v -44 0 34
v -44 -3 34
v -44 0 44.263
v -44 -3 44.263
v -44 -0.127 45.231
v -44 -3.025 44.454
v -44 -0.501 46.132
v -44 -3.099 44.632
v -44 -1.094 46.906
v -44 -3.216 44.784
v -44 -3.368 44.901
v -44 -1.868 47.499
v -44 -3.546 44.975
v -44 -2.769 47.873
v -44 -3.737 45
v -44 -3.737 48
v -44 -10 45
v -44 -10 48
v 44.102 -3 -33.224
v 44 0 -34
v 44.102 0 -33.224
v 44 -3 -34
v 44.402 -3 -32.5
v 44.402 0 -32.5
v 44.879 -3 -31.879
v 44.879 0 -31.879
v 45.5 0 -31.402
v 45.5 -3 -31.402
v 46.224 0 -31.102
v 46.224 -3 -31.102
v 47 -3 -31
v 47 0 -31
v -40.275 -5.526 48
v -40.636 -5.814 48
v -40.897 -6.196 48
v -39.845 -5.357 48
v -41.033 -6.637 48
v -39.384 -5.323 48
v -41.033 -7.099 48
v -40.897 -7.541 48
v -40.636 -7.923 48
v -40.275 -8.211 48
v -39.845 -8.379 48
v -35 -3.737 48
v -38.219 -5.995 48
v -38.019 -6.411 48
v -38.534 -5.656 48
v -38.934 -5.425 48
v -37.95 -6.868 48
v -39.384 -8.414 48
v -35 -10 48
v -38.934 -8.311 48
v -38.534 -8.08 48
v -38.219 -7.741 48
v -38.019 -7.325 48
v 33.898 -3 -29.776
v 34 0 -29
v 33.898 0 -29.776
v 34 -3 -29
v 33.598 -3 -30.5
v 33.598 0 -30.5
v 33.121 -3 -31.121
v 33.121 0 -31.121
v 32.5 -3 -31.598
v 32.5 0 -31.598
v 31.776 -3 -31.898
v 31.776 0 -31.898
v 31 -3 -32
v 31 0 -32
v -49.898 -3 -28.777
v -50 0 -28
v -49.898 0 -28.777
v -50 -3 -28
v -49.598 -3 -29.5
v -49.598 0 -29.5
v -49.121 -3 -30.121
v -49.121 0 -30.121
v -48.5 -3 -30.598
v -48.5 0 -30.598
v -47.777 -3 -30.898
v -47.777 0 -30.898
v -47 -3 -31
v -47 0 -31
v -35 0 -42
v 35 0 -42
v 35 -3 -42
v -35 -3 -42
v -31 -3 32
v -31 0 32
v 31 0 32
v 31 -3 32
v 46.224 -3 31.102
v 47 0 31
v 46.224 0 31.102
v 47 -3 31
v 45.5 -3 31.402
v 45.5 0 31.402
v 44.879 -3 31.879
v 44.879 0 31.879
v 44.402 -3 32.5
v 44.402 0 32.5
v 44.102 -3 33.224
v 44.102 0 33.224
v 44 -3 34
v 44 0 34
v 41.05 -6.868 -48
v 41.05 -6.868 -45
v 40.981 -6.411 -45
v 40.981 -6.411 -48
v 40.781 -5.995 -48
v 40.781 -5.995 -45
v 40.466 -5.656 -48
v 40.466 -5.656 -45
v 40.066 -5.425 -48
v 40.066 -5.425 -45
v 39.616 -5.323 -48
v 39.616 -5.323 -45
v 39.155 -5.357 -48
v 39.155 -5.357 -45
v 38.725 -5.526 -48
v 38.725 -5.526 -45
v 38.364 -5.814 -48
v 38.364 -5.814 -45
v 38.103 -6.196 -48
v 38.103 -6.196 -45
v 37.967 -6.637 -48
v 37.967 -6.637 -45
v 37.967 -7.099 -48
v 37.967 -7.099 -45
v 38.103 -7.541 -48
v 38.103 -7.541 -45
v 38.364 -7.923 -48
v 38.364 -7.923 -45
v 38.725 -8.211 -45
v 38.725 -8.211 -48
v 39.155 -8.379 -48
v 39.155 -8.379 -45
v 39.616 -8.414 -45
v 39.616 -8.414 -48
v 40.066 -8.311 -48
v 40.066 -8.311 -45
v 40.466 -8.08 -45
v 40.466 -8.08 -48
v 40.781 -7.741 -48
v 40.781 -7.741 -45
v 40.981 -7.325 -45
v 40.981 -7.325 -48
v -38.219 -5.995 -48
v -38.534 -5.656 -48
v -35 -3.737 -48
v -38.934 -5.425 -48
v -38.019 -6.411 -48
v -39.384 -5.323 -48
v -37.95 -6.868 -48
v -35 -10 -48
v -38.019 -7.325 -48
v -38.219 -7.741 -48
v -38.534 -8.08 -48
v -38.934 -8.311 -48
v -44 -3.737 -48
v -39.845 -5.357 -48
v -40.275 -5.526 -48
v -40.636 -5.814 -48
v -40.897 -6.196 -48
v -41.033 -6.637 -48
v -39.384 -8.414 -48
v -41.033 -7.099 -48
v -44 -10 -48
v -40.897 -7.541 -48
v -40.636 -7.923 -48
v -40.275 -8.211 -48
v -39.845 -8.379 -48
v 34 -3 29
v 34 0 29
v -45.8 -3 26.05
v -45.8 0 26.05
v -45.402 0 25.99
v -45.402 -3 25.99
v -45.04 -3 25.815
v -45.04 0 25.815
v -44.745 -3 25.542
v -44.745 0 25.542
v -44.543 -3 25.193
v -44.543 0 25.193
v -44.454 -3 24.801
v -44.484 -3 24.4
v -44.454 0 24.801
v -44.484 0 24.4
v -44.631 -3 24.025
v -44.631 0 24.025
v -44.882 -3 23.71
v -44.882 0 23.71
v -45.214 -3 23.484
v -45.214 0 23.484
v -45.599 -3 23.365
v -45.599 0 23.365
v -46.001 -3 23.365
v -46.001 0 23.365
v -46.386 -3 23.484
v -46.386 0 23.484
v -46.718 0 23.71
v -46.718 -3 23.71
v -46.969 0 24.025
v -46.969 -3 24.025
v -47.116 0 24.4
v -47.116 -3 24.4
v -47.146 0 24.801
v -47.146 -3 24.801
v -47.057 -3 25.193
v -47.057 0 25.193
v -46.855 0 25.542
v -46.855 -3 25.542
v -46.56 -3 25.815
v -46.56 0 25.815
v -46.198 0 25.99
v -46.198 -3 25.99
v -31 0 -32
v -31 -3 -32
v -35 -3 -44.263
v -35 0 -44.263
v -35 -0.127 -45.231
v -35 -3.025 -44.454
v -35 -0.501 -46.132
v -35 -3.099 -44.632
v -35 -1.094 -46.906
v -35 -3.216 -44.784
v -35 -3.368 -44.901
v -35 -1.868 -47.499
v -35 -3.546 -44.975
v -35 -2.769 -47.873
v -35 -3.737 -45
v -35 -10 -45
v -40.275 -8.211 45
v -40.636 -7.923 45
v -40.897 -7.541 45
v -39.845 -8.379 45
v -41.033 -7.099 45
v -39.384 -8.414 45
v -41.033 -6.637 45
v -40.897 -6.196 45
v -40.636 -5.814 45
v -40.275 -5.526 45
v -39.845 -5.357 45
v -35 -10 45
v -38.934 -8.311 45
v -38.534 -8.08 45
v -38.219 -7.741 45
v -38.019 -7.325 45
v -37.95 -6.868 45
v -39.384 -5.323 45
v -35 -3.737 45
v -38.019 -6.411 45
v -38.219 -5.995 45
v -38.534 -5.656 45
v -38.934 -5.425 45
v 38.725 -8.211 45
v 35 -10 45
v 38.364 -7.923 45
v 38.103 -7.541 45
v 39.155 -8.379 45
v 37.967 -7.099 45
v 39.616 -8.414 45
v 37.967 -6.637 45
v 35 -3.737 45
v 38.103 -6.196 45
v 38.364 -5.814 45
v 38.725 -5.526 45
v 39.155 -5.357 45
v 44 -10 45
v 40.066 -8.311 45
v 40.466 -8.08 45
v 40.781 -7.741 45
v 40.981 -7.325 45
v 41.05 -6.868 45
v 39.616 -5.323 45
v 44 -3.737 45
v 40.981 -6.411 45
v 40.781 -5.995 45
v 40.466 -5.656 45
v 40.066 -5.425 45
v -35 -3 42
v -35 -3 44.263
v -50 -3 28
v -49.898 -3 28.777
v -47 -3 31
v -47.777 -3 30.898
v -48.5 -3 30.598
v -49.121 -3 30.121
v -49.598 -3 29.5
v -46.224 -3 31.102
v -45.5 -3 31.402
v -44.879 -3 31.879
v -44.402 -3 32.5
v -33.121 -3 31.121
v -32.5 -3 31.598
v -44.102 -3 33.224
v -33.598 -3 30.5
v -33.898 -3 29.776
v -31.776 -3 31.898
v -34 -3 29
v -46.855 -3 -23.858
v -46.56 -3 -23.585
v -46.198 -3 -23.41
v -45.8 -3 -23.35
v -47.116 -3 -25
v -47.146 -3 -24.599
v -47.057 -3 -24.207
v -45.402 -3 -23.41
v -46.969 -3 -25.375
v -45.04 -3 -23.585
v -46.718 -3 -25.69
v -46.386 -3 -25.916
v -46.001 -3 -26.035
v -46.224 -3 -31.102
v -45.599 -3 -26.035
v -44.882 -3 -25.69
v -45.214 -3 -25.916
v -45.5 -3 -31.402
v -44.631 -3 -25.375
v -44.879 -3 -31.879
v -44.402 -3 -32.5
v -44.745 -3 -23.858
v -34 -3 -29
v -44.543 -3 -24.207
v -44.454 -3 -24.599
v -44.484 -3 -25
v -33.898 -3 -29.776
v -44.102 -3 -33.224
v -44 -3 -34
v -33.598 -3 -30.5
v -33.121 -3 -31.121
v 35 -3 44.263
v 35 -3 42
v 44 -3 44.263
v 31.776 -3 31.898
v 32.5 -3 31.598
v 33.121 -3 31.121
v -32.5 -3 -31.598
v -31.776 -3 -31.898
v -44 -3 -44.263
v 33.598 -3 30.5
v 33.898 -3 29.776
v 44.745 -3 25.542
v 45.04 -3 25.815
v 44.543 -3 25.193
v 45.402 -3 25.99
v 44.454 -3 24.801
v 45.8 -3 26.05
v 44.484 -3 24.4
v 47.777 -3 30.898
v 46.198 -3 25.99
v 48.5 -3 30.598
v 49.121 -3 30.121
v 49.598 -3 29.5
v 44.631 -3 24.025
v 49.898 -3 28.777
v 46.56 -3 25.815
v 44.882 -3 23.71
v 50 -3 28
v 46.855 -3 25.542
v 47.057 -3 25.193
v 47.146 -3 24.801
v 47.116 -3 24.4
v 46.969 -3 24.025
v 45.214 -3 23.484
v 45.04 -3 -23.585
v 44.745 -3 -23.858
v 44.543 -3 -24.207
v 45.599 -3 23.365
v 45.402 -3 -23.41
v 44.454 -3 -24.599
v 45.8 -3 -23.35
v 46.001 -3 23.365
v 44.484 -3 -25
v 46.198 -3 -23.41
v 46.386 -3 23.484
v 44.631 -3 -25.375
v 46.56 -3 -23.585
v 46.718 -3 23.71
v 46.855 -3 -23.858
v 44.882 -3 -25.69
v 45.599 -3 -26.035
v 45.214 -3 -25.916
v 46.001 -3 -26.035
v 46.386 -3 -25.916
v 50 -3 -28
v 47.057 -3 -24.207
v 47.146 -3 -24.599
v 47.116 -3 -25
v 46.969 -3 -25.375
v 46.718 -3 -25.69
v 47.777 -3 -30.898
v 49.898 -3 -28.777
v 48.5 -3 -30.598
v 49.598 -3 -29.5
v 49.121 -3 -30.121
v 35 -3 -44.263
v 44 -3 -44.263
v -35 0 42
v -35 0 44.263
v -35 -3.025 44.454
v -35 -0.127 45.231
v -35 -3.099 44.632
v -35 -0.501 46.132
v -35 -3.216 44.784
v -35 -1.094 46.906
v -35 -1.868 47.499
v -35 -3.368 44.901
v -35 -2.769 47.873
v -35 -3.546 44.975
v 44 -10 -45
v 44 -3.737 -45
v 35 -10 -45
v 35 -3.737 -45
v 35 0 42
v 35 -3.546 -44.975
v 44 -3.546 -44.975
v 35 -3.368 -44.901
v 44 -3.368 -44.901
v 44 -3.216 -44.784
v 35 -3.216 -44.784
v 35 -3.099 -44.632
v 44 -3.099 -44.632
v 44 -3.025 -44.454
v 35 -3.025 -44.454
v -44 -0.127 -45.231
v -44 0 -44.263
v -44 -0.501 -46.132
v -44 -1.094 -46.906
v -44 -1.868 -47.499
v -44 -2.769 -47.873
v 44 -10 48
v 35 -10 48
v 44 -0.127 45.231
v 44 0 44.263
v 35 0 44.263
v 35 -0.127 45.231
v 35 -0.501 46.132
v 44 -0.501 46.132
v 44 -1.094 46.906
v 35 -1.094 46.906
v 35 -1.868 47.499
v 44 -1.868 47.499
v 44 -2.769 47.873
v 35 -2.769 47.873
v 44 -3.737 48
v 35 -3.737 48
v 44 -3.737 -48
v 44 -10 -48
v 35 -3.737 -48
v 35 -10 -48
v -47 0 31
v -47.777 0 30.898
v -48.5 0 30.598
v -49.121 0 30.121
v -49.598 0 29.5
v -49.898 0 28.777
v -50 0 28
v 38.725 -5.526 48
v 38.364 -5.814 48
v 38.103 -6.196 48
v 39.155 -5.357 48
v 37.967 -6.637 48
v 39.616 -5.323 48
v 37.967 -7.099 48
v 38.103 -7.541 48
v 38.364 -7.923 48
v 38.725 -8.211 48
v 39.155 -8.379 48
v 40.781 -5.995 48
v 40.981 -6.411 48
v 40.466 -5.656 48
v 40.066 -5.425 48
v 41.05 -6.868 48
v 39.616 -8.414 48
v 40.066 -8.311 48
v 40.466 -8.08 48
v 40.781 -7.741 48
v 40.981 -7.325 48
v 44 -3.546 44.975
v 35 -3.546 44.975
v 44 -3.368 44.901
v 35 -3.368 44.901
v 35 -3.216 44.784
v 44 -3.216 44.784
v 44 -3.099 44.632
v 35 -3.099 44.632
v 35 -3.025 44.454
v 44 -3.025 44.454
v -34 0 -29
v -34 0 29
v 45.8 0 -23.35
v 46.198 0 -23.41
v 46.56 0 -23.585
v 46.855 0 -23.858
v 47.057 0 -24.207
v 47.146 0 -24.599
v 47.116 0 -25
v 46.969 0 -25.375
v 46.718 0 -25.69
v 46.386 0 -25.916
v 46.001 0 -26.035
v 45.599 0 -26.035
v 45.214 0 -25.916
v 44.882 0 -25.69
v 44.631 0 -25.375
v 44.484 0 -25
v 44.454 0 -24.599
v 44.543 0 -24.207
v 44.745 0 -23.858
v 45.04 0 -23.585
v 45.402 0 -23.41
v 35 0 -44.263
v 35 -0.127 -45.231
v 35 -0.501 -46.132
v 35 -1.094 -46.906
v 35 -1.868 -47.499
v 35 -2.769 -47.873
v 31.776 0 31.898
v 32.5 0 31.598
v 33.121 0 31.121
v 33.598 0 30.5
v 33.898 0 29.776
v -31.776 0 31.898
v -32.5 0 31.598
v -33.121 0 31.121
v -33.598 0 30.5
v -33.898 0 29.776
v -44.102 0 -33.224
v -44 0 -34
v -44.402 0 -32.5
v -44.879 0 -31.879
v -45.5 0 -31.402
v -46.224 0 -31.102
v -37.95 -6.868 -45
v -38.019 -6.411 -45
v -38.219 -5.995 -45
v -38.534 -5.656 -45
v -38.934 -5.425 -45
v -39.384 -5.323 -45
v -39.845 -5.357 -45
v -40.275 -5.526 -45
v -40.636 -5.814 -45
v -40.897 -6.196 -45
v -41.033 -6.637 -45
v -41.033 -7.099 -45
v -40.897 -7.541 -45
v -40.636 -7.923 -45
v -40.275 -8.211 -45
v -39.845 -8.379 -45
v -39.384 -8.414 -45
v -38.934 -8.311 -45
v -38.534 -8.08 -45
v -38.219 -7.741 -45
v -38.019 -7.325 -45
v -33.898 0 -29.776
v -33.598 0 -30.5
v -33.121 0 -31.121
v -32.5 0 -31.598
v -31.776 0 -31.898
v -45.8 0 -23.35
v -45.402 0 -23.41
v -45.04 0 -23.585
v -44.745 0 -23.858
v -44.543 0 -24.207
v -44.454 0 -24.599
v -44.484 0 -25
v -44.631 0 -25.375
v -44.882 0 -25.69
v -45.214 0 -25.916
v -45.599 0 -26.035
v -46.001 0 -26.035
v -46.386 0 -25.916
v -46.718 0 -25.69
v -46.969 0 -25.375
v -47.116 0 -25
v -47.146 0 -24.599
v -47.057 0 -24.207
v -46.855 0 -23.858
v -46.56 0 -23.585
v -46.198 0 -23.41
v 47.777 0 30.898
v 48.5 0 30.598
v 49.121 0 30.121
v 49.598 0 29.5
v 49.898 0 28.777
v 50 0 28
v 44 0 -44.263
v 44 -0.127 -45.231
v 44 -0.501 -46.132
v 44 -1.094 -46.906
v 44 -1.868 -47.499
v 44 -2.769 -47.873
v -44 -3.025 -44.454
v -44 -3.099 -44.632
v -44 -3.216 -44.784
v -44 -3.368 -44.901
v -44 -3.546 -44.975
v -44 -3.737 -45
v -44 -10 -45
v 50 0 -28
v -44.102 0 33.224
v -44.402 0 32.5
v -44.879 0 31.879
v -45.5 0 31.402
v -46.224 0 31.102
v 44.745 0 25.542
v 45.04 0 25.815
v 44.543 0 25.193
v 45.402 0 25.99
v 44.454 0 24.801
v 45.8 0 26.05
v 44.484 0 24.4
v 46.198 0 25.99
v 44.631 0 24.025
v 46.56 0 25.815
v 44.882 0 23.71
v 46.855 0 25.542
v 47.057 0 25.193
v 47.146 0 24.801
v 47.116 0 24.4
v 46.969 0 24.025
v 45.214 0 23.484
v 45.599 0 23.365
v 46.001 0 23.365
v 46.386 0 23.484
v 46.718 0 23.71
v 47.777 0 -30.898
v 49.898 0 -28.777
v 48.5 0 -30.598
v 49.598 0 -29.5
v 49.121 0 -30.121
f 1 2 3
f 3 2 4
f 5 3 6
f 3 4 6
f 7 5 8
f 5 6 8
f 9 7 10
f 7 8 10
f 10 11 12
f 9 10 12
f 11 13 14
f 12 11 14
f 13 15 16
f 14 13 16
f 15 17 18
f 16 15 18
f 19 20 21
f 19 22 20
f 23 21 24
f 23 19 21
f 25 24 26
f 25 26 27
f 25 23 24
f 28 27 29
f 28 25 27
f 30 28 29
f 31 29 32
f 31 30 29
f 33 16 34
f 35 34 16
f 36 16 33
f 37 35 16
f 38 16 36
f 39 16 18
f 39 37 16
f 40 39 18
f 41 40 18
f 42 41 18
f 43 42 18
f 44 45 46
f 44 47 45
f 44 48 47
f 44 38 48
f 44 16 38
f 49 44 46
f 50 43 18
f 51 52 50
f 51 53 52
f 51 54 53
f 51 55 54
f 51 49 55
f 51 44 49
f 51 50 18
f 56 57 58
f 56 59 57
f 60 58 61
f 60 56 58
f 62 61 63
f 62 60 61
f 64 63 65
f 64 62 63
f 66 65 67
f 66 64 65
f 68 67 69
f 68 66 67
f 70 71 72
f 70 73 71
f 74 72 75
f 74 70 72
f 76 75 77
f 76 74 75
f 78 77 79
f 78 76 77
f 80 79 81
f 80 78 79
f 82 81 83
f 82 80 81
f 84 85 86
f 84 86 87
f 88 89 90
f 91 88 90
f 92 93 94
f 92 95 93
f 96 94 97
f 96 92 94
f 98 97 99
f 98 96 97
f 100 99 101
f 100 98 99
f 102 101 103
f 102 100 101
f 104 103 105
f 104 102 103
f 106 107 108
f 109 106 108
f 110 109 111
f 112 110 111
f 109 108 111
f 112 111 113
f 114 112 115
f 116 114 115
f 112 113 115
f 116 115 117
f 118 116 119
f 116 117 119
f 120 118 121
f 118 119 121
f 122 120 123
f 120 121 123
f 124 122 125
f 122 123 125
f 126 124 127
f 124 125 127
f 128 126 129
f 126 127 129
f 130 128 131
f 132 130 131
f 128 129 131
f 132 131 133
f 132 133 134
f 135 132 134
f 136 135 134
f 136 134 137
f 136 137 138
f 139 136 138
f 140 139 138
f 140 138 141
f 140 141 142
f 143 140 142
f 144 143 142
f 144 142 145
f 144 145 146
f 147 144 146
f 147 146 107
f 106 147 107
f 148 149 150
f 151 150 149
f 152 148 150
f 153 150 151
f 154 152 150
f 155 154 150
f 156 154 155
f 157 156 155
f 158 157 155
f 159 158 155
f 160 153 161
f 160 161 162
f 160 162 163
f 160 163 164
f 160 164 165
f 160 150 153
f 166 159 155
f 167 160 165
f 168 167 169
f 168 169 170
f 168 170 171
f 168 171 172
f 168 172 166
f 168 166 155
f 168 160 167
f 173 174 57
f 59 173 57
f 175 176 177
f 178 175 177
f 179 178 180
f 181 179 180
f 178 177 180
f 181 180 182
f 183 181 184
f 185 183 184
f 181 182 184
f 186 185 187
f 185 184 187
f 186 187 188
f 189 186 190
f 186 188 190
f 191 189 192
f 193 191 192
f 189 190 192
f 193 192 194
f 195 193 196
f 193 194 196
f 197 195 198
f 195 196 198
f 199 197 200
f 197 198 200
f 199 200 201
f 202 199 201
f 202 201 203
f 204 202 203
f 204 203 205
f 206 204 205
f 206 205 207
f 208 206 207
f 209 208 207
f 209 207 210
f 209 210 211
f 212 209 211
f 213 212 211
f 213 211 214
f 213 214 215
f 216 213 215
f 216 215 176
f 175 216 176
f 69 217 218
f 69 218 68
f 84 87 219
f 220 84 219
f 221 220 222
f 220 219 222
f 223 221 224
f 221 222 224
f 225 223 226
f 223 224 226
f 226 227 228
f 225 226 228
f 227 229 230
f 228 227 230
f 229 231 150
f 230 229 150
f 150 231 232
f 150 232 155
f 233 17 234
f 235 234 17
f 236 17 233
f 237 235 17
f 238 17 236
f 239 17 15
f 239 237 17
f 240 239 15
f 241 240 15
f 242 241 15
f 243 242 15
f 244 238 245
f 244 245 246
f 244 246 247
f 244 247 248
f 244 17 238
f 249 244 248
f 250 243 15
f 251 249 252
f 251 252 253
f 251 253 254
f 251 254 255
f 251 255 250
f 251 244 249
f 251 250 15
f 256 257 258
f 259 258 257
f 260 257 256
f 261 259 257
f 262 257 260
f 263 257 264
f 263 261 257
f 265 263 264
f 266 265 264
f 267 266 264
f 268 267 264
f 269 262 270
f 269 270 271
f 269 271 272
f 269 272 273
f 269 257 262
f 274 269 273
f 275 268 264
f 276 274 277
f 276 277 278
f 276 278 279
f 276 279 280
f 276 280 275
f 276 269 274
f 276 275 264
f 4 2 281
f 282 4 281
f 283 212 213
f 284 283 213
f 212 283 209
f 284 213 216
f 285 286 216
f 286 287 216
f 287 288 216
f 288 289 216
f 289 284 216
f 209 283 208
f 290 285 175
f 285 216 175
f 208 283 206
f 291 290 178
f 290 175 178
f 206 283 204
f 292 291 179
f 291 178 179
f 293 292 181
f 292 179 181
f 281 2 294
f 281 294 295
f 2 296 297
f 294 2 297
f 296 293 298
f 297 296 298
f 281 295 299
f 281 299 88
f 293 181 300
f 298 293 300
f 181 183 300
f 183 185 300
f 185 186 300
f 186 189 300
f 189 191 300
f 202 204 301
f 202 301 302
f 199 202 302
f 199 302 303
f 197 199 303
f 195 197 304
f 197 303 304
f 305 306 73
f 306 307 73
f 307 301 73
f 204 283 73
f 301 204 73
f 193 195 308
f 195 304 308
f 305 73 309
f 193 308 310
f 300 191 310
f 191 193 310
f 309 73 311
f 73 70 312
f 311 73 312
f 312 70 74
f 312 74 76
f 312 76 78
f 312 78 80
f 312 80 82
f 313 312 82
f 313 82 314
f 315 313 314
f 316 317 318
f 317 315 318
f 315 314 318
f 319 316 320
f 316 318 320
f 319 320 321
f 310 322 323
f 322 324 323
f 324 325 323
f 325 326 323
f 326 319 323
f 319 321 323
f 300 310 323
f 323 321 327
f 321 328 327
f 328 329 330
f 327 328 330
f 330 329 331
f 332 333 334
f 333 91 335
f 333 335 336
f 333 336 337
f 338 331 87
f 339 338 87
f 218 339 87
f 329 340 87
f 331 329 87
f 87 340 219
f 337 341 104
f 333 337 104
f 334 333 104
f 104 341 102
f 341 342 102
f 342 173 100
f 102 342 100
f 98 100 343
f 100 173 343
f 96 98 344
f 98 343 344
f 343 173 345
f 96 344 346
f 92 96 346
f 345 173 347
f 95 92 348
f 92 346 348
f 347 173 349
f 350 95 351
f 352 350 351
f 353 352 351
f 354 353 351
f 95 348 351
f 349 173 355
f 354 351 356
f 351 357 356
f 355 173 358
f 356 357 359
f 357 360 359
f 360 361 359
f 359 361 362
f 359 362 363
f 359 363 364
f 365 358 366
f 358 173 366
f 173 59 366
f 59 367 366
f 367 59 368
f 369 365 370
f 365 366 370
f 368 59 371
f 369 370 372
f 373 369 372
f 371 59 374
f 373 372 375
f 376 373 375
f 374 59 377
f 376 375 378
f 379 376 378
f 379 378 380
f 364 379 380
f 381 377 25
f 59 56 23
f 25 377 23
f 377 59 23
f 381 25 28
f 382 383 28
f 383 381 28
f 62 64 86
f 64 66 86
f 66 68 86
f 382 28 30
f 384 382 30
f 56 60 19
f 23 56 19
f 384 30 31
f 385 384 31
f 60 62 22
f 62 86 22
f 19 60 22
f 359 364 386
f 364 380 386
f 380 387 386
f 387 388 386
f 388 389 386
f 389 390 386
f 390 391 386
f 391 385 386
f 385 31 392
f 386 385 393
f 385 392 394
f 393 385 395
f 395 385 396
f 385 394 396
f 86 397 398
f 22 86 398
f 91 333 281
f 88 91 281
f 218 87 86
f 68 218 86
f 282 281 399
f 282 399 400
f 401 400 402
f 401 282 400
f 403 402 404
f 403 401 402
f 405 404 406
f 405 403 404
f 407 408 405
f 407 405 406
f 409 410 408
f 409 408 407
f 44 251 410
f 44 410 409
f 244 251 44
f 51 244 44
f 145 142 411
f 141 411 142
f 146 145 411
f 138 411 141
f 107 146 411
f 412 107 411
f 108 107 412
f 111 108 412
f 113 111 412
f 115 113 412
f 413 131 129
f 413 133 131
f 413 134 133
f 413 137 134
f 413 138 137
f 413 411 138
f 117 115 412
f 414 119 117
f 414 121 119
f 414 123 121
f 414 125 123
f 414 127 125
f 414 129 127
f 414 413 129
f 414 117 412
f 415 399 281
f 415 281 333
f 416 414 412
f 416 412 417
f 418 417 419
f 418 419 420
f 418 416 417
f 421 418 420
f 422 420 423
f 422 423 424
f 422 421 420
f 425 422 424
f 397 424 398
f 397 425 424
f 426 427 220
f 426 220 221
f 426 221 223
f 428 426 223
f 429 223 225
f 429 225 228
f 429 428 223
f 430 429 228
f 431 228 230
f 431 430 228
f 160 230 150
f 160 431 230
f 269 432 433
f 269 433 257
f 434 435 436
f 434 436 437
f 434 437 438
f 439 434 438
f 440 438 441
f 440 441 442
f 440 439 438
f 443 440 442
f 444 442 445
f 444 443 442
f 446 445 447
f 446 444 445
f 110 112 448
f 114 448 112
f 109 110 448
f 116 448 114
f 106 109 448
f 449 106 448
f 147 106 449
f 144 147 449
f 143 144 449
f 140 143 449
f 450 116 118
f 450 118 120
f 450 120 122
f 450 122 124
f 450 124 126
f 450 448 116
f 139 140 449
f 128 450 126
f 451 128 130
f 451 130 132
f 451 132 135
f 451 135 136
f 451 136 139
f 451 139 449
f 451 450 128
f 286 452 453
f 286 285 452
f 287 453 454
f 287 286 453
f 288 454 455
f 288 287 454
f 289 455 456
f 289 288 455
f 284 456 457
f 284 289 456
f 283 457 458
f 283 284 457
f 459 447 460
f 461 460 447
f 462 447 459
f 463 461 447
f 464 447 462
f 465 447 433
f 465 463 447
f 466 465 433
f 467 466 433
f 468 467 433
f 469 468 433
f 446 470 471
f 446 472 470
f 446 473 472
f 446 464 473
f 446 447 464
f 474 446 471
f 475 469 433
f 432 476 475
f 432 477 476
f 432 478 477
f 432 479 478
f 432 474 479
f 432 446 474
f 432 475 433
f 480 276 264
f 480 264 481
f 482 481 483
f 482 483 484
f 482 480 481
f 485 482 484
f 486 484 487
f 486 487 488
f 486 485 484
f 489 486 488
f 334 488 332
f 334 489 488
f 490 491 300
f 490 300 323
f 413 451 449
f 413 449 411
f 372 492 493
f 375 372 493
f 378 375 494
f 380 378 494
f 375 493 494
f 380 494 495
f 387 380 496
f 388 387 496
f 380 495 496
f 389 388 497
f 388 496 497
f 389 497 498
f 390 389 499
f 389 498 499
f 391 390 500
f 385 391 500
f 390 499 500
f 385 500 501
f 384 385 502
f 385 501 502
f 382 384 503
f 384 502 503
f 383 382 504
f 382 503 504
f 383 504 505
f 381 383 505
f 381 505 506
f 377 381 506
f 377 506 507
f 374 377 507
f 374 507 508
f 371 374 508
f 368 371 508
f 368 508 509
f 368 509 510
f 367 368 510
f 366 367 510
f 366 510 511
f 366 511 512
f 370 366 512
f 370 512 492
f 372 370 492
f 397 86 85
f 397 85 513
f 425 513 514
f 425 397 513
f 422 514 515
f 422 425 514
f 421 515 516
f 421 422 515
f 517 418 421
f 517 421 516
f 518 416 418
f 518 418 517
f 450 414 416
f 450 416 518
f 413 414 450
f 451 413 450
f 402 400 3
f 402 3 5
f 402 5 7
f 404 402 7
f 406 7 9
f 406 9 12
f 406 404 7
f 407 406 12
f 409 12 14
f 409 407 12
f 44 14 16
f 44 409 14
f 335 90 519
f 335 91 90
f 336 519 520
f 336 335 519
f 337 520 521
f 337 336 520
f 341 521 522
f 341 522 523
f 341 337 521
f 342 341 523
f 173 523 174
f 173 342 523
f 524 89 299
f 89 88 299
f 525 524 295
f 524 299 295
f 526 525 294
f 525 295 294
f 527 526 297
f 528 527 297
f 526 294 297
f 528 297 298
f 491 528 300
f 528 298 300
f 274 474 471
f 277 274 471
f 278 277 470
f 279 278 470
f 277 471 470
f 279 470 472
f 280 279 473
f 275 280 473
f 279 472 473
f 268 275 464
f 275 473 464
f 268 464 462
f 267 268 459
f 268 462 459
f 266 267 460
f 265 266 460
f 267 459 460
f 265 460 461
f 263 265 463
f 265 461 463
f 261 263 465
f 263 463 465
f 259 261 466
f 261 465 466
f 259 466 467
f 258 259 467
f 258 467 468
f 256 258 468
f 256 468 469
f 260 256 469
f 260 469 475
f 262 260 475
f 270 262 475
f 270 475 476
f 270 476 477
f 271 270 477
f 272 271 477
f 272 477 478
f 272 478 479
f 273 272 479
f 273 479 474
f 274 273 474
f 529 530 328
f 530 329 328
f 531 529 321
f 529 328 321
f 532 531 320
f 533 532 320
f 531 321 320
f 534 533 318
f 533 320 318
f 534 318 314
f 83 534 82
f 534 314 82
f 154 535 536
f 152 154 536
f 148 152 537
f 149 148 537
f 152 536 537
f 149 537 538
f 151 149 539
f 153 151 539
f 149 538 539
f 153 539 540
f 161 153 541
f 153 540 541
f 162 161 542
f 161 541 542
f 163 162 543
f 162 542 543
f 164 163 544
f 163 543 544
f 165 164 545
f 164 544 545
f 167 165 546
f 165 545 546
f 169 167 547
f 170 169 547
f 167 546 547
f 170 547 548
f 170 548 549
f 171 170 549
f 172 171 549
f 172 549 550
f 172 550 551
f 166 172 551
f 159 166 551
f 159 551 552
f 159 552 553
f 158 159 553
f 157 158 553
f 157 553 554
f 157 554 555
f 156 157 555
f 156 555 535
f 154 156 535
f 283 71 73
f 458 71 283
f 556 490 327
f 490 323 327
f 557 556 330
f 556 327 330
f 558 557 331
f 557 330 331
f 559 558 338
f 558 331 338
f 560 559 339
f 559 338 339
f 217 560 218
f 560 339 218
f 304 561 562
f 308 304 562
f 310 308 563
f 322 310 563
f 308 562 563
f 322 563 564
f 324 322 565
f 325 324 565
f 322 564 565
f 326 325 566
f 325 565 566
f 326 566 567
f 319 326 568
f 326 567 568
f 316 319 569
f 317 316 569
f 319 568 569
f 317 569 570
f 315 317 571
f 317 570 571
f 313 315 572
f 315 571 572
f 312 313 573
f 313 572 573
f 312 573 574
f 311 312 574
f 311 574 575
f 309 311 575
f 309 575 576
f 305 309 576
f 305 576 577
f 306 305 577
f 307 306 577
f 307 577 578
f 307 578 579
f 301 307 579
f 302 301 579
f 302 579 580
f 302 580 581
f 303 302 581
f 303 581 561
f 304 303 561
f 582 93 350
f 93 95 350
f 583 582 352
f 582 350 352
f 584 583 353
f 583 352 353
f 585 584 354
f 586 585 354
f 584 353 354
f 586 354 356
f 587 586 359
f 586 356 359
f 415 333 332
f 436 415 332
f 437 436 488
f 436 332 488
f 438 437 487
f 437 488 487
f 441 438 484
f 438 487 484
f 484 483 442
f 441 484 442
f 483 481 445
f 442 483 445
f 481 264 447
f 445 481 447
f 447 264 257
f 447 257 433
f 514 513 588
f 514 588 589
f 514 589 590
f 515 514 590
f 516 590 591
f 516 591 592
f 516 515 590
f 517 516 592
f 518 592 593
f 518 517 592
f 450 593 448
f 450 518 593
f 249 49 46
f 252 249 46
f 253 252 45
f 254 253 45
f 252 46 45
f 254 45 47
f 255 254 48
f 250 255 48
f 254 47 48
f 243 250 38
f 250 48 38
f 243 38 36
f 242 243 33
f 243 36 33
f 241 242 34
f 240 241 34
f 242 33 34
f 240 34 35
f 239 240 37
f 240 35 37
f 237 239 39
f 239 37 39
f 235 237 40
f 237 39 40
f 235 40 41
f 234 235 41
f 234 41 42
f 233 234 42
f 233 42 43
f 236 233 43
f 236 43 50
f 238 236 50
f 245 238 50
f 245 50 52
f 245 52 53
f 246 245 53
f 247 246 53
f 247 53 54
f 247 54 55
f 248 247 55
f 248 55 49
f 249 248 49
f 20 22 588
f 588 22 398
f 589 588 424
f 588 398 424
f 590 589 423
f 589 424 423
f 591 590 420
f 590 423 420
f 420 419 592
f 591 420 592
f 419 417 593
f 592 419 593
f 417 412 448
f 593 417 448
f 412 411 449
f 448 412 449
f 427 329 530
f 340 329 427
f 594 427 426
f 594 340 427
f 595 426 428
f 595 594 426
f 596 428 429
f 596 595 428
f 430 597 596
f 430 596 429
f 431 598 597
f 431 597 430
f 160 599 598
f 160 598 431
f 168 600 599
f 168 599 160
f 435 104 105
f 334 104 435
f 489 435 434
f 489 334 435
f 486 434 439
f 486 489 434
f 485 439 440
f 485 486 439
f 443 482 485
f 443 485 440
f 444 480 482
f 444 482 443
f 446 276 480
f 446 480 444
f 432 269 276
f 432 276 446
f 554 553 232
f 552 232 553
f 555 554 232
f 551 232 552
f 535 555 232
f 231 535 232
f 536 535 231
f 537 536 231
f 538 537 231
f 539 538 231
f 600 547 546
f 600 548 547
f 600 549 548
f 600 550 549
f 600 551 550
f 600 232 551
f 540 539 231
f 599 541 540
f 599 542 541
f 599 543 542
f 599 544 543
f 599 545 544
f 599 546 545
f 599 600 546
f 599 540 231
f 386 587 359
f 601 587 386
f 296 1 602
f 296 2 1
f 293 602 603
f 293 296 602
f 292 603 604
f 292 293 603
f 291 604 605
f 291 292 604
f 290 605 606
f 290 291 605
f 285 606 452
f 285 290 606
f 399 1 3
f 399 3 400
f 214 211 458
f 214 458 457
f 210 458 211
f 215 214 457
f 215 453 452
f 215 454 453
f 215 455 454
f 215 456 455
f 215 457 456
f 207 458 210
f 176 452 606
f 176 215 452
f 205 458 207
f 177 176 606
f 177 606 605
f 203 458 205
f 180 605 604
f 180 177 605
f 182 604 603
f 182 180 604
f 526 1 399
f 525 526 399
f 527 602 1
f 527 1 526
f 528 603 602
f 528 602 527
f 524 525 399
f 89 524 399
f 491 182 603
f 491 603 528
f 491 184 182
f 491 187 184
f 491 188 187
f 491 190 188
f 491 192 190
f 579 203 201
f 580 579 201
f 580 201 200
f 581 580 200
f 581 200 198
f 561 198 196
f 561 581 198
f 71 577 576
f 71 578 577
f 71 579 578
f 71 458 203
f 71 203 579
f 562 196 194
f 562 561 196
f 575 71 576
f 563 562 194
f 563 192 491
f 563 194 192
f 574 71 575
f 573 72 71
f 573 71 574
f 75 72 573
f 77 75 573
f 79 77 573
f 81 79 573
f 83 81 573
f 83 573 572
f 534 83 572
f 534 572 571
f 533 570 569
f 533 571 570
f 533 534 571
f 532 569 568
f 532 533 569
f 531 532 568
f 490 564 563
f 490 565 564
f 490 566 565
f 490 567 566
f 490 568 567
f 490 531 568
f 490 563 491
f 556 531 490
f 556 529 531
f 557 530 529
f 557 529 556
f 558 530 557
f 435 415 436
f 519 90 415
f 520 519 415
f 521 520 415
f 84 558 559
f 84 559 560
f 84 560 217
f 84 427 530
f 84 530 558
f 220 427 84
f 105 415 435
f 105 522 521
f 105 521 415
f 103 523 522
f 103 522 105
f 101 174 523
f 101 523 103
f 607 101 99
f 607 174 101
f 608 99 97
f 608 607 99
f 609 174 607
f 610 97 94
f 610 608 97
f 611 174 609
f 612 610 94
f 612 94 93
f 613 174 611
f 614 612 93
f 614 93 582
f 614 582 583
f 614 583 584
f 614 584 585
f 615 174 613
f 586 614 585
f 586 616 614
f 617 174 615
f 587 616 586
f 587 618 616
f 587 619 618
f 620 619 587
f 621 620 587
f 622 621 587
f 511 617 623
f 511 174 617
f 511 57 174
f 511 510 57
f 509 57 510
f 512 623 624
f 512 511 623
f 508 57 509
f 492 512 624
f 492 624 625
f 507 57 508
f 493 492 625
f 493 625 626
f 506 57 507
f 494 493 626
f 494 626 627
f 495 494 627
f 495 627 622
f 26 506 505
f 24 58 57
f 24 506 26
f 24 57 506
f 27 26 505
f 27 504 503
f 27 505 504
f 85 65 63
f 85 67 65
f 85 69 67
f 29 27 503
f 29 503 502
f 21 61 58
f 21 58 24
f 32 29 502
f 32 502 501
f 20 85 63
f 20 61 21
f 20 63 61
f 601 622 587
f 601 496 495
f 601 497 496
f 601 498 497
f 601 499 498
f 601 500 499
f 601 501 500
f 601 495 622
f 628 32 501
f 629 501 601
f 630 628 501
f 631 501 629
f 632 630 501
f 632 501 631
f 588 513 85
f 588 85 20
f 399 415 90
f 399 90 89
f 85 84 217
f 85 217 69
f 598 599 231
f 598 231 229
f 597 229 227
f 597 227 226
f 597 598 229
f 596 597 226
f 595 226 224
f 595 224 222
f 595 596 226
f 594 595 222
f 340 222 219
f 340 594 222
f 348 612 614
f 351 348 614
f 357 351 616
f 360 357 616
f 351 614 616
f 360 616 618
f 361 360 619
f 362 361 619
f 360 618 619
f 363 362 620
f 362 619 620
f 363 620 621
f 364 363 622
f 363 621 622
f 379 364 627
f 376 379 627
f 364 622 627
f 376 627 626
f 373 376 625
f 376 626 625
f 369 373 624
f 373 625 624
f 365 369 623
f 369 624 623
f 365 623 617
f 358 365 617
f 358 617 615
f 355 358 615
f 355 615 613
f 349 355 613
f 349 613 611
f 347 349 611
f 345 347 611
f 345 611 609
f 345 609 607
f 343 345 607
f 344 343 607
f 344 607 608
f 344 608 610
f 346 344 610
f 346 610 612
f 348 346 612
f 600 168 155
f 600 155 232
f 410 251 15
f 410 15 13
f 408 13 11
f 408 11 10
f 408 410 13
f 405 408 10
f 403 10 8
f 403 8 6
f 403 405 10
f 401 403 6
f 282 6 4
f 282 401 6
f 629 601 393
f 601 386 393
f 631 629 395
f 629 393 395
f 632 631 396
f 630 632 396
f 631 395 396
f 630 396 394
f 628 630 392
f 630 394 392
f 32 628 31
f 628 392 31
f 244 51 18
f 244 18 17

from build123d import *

# Parameters (mm, degrees)
SKETCH3_W                      = 68
SKETCH3_H                      = 64
BASE_FLANGE1_DEPTH             = 3
EDGE_FLANGE1_STRIP_W           = 13.4732
EDGE_FLANGE1_STRIP_H           = 3
EDGE_FLANGE1_STRIP_CUT_DEPTH   = 9
EDGE_FLANGE1_STRIP_2_W         = 13.4732
EDGE_FLANGE1_STRIP_2_H         = 3
EDGE_FLANGE1_STRIP_CUT_2_DEPTH = 9
EDGE_FLANGE1_STRIP_3_W         = 13.4732
EDGE_FLANGE1_STRIP_3_H         = 3
EDGE_FLANGE1_STRIP_CUT_3_DEPTH = 9
EDGE_FLANGE1_STRIP_4_W         = 13.4732
EDGE_FLANGE1_STRIP_4_H         = 3
EDGE_FLANGE1_STRIP_CUT_4_DEPTH = 9
EDGE_FLANGE1_DEPTH             = 9
EDGE_FLANGE1_BEND_DEPTH        = 9
EDGE_FLANGE1_BEND_2_DEPTH      = 9
EDGE_FLANGE1_BEND_3_DEPTH      = 9
FILLET1_R                      = 3
FILLET2_R                      = 3
SKETCH20_R                     = 1.55
CUT_EXTRUDE1_DEPTH             = 109.701425934
SKETCH22_R                     = 1.35
CUT_EXTRUDE2_DEPTH             = 71.0285656


# Sheet-metal steps are written as plain solids
with BuildPart() as part:
    # Sketch3 → Base-Flange1 (new body)
    with BuildSketch(Plane(origin=(0, 0, 0), x_dir=(1, 0, 0), z_dir=(0, 1, 0))):
        Polygon((50, 31), (44, 31), (44, 48), (35, 48), (35, 42), (-35, 42), (-35, 48), (-44, 48), (-44, 31), (-50, 31), (-50, -31), (-44, -31), (-44, -48), (-35, -48), (-35, -42), (35, -42), (35, -48), (44, -48), (44, -31), (50, -31), align=None)
        Rectangle(SKETCH3_W, SKETCH3_H, mode=Mode.SUBTRACT)
    extrude(amount=-BASE_FLANGE1_DEPTH)

    # Edge-Flange1 strip (across the edge) → Edge-Flange1 strip cut (cut)
    with BuildSketch(Plane(origin=(-35, -3, 48), x_dir=(0, 0, -1), z_dir=(-1, 0, 0))):
        with Locations((-3, -1.5)):
            Rectangle(EDGE_FLANGE1_STRIP_W, EDGE_FLANGE1_STRIP_H)
    extrude(amount=EDGE_FLANGE1_STRIP_CUT_DEPTH, mode=Mode.SUBTRACT)

    # Edge-Flange1 strip 2 (across the edge) → Edge-Flange1 strip cut 2 (cut)
    with BuildSketch(Plane(origin=(44, -3, 48), x_dir=(0, 0, -1), z_dir=(-1, 0, 0))):
        with Locations((-3, -1.5)):
            Rectangle(EDGE_FLANGE1_STRIP_2_W, EDGE_FLANGE1_STRIP_2_H)
    extrude(amount=EDGE_FLANGE1_STRIP_CUT_2_DEPTH, mode=Mode.SUBTRACT)

    # Edge-Flange1 strip 3 (across the edge) → Edge-Flange1 strip cut 3 (cut)
    with BuildSketch(Plane(origin=(35, -3, -48), x_dir=(0, 0, 1), z_dir=(1, 0, 0))):
        with Locations((-3, -1.5)):
            Rectangle(EDGE_FLANGE1_STRIP_3_W, EDGE_FLANGE1_STRIP_3_H)
    extrude(amount=EDGE_FLANGE1_STRIP_CUT_3_DEPTH, mode=Mode.SUBTRACT)

    # Edge-Flange1 strip 4 (across the edge) → Edge-Flange1 strip cut 4 (cut)
    with BuildSketch(Plane(origin=(-44, -3, -48), x_dir=(0, 0, 1), z_dir=(1, 0, 0))):
        with Locations((-3, -1.5)):
            Rectangle(EDGE_FLANGE1_STRIP_4_W, EDGE_FLANGE1_STRIP_4_H)
    extrude(amount=EDGE_FLANGE1_STRIP_CUT_4_DEPTH, mode=Mode.SUBTRACT)

    # Edge-Flange1 section (across the edge) → Edge-Flange1 (add)
    with BuildSketch(Plane(origin=(-35, -3, 48), x_dir=(0, 0, -1), z_dir=(-1, 0, 0))):
        with BuildLine():
            Line((0, 0.7366), (0, 7))
            Line((0, 7), (3, 7))
            Line((3, 7), (3, 0.7366))
            ThreePointArc((3, 0.7366), (3.215745145, 0.215745145), (3.7366, 0))
            Line((3.7366, 0), (3.7366, -3))
            ThreePointArc((3.7366, -3), (1.094424801, -1.905575199), (0, 0.7366))
        make_face()
    extrude(amount=EDGE_FLANGE1_DEPTH)

    # Edge-Flange1 section 2 (across the edge) → Edge-Flange1 bend (add)
    with BuildSketch(Plane(origin=(44, -3, 48), x_dir=(0, 0, -1), z_dir=(-1, 0, 0))):
        with BuildLine():
            Line((0, 0.7366), (0, 7))
            Line((0, 7), (3, 7))
            Line((3, 7), (3, 0.7366))
            ThreePointArc((3, 0.7366), (3.215745145, 0.215745145), (3.7366, 0))
            Line((3.7366, 0), (3.7366, -3))
            ThreePointArc((3.7366, -3), (1.094424801, -1.905575199), (0, 0.7366))
        make_face()
    extrude(amount=EDGE_FLANGE1_BEND_DEPTH)

    # Edge-Flange1 section 3 (across the edge) → Edge-Flange1 bend 2 (add)
    with BuildSketch(Plane(origin=(35, -3, -48), x_dir=(0, 0, 1), z_dir=(1, 0, 0))):
        with BuildLine():
            Line((0, 0.7366), (0, 7))
            Line((0, 7), (3, 7))
            Line((3, 7), (3, 0.7366))
            ThreePointArc((3, 0.7366), (3.215745145, 0.215745145), (3.7366, 0))
            Line((3.7366, 0), (3.7366, -3))
            ThreePointArc((3.7366, -3), (1.094424801, -1.905575199), (0, 0.7366))
        make_face()
    extrude(amount=EDGE_FLANGE1_BEND_2_DEPTH)

    # Edge-Flange1 section 4 (across the edge) → Edge-Flange1 bend 3 (add)
    with BuildSketch(Plane(origin=(-44, -3, -48), x_dir=(0, 0, 1), z_dir=(1, 0, 0))):
        with BuildLine():
            Line((0, 0.7366), (0, 7))
            Line((0, 7), (3, 7))
            Line((3, 7), (3, 0.7366))
            ThreePointArc((3, 0.7366), (3.215745145, 0.215745145), (3.7366, 0))
            Line((3.7366, 0), (3.7366, -3))
            ThreePointArc((3.7366, -3), (1.094424801, -1.905575199), (0, 0.7366))
        make_face()
    extrude(amount=EDGE_FLANGE1_BEND_3_DEPTH)

    # Fillet1
    fillet1_edges = [part.edges().sort_by_distance(p)[0] for p in [
        (44, -1.5, 31),
        (-44, -1.5, 31),
        (-44, -1.5, -31),
        (44, -1.5, -31),
        (-34, -1.5, 32),
        (-34, -1.5, -32),
        (34, -1.5, -32),
        (34, -1.5, 32),
    ]]
    fillet(fillet1_edges, radius=FILLET1_R)

    # Fillet2
    fillet2_edges = [part.edges().sort_by_distance(p)[0] for p in [
        (50, -1.5, -31),
        (50, -1.5, 31),
        (-50, -1.5, 31),
        (-50, -1.5, -31),
    ]]
    fillet(fillet2_edges, radius=FILLET2_R - 0.0001)  # a hair under: the kernel refuses the full size

    # Sketch20 → Cut-Extrude1 (cut, through all)
    with BuildSketch(Plane.XY.offset(48)):
        with Locations((-39.5, -6.8683)):
            Circle(SKETCH20_R)
        with Locations((39.5, -6.8683)):
            Circle(SKETCH20_R)
    extrude(amount=-CUT_EXTRUDE1_DEPTH, mode=Mode.SUBTRACT)

    # Sketch22 → Cut-Extrude2 (cut, through all)
    with BuildSketch(Plane(origin=(0, 0, 0), x_dir=(1, 0, 0), z_dir=(0, 1, 0))):
        with Locations(Location((-45.8, 24.7, 0), (0, 0, 270))):
            Circle(SKETCH22_R)
        with Locations(Location((-45.8, -24.7, 0), (0, 0, 270))):
            Circle(SKETCH22_R)
        with Locations(Location((45.8, 24.7, 0), (0, 0, 270))):
            Circle(SKETCH22_R)
        with Locations(Location((45.8, -24.7, 0), (0, 0, 270))):
            Circle(SKETCH22_R)
    extrude(amount=-CUT_EXTRUDE2_DEPTH, mode=Mode.SUBTRACT)


solid = part.part
